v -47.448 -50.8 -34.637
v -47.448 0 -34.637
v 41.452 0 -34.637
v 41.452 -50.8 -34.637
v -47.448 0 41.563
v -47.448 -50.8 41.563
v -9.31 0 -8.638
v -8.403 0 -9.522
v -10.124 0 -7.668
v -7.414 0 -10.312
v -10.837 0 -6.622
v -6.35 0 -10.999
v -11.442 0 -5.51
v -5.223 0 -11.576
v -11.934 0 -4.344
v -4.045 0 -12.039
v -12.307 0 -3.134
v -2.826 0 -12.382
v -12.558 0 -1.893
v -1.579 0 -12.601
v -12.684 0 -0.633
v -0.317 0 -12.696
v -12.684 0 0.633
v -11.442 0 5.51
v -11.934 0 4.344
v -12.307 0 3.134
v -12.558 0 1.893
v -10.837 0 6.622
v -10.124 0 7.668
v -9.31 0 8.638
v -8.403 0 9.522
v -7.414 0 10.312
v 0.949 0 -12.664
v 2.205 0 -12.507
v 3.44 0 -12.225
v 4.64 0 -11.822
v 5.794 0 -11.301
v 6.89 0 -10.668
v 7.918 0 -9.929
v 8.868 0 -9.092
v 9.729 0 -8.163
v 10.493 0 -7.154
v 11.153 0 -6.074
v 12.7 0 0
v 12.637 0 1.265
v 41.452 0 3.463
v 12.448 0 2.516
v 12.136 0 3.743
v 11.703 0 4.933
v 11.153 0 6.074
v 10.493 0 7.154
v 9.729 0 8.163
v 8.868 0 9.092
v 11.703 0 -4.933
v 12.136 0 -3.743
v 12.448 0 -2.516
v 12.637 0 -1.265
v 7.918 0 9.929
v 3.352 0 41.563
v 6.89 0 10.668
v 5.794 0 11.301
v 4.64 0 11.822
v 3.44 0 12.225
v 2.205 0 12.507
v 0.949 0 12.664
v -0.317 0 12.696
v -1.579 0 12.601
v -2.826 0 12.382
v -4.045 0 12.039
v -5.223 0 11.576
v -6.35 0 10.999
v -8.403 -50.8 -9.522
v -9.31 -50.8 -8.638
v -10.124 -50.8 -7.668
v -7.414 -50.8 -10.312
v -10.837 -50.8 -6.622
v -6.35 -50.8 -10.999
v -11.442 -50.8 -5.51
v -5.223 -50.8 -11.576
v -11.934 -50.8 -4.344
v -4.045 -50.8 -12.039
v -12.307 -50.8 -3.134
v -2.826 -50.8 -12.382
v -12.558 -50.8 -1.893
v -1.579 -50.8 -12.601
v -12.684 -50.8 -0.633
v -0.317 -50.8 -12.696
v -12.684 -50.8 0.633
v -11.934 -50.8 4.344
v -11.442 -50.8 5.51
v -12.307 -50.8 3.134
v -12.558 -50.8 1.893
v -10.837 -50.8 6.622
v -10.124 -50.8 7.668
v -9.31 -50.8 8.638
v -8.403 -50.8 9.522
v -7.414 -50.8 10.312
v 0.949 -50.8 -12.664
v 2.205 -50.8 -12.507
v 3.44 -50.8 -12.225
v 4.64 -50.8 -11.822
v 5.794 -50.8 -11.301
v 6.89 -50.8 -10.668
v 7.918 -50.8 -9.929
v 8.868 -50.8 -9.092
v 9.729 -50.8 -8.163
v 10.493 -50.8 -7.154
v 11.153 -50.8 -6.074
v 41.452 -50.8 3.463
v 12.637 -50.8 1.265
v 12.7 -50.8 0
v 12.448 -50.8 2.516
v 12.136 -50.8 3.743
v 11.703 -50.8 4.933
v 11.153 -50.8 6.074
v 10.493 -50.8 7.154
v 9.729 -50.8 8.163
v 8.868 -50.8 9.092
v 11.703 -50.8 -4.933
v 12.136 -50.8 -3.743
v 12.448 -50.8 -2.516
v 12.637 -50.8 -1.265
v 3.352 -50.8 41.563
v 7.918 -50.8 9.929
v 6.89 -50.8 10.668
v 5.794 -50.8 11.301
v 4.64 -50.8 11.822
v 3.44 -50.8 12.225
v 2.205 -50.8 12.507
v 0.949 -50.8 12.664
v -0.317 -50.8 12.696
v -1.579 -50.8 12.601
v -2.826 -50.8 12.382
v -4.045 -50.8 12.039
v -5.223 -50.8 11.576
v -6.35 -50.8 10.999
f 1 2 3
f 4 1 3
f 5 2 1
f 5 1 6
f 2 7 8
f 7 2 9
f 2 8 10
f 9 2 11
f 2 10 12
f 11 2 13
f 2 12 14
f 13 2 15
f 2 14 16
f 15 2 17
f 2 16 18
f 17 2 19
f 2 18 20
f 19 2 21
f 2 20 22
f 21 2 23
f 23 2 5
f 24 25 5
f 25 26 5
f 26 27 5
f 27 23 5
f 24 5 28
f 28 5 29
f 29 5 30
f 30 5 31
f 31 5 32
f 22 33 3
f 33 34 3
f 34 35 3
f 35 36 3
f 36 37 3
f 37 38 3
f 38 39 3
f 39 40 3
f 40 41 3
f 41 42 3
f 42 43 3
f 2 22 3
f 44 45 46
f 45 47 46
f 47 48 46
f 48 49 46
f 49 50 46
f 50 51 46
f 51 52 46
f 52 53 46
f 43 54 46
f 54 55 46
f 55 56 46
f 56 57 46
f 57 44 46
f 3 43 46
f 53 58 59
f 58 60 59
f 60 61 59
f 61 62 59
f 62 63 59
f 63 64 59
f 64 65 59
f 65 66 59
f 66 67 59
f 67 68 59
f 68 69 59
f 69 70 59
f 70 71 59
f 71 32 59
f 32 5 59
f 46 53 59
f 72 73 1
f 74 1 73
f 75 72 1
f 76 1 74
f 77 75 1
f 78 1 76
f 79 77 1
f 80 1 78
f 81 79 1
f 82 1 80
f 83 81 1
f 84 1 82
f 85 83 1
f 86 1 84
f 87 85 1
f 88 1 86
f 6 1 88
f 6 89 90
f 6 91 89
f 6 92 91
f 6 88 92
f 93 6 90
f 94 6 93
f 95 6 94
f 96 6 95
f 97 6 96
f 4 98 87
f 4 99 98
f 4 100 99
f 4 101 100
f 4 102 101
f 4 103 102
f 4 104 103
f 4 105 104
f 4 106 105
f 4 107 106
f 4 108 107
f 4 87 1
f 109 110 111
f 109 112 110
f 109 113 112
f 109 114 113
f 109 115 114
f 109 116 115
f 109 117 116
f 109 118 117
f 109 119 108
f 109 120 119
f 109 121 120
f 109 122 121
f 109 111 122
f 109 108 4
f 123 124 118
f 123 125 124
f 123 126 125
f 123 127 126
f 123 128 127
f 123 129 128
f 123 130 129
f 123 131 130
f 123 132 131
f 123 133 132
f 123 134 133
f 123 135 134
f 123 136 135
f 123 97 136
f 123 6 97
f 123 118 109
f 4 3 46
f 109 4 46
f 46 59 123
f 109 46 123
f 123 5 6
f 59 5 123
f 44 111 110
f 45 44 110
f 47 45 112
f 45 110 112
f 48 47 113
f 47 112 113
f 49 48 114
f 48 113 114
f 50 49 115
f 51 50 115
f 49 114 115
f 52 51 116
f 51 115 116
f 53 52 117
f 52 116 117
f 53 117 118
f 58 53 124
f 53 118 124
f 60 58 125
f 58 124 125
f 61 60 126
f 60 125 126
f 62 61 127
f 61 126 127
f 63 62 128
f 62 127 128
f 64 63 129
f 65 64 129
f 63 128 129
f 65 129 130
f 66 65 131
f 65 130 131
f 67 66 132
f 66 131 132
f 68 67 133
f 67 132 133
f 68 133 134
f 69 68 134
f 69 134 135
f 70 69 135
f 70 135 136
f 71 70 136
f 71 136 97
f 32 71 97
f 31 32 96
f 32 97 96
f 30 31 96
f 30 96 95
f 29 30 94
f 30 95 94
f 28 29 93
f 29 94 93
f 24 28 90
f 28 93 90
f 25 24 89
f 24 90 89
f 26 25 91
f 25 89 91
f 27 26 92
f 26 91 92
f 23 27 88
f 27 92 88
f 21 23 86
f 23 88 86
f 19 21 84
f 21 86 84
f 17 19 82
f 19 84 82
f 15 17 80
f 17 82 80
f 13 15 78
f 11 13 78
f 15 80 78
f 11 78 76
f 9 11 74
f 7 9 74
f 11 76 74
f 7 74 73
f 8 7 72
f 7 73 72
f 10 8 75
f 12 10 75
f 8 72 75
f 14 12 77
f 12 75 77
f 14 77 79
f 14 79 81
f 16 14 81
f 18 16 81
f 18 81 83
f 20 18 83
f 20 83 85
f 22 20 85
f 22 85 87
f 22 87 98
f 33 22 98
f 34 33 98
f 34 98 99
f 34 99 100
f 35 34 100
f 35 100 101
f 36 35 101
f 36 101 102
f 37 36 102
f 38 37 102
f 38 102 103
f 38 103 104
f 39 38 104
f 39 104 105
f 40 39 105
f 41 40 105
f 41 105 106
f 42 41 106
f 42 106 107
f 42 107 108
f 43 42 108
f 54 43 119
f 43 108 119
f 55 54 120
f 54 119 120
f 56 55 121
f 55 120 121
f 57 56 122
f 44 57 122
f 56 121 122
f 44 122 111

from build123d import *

# Parameters (mm, degrees)
F0_W     = 88.9
F0_H     = 76.2
F1_DEPTH = 50.8
F2_SIZE  = 38.1
F3_R     = 12.7
F4_DEPTH = 50.8


with BuildPart() as f1:
    # F0 (on Front) → F1 (new body)
    with BuildSketch(Plane.XZ):
        with Locations((-2.997909, 3.463231)):
            Rectangle(F0_W, F0_H)
    extrude(amount=F1_DEPTH)

    # F2
    f2_edges = [f1.edges().sort_by_distance(p)[0] for p in [
        (41.452091, -25.4, 41.563231),
    ]]
    chamfer(f2_edges, length=F2_SIZE)

    # F3 (on face) → F4 (cut)
    with BuildSketch(Plane.XZ.offset(50.8)):
        Circle(F3_R)
    extrude(amount=-F4_DEPTH, mode=Mode.SUBTRACT)


solid = f1.part
